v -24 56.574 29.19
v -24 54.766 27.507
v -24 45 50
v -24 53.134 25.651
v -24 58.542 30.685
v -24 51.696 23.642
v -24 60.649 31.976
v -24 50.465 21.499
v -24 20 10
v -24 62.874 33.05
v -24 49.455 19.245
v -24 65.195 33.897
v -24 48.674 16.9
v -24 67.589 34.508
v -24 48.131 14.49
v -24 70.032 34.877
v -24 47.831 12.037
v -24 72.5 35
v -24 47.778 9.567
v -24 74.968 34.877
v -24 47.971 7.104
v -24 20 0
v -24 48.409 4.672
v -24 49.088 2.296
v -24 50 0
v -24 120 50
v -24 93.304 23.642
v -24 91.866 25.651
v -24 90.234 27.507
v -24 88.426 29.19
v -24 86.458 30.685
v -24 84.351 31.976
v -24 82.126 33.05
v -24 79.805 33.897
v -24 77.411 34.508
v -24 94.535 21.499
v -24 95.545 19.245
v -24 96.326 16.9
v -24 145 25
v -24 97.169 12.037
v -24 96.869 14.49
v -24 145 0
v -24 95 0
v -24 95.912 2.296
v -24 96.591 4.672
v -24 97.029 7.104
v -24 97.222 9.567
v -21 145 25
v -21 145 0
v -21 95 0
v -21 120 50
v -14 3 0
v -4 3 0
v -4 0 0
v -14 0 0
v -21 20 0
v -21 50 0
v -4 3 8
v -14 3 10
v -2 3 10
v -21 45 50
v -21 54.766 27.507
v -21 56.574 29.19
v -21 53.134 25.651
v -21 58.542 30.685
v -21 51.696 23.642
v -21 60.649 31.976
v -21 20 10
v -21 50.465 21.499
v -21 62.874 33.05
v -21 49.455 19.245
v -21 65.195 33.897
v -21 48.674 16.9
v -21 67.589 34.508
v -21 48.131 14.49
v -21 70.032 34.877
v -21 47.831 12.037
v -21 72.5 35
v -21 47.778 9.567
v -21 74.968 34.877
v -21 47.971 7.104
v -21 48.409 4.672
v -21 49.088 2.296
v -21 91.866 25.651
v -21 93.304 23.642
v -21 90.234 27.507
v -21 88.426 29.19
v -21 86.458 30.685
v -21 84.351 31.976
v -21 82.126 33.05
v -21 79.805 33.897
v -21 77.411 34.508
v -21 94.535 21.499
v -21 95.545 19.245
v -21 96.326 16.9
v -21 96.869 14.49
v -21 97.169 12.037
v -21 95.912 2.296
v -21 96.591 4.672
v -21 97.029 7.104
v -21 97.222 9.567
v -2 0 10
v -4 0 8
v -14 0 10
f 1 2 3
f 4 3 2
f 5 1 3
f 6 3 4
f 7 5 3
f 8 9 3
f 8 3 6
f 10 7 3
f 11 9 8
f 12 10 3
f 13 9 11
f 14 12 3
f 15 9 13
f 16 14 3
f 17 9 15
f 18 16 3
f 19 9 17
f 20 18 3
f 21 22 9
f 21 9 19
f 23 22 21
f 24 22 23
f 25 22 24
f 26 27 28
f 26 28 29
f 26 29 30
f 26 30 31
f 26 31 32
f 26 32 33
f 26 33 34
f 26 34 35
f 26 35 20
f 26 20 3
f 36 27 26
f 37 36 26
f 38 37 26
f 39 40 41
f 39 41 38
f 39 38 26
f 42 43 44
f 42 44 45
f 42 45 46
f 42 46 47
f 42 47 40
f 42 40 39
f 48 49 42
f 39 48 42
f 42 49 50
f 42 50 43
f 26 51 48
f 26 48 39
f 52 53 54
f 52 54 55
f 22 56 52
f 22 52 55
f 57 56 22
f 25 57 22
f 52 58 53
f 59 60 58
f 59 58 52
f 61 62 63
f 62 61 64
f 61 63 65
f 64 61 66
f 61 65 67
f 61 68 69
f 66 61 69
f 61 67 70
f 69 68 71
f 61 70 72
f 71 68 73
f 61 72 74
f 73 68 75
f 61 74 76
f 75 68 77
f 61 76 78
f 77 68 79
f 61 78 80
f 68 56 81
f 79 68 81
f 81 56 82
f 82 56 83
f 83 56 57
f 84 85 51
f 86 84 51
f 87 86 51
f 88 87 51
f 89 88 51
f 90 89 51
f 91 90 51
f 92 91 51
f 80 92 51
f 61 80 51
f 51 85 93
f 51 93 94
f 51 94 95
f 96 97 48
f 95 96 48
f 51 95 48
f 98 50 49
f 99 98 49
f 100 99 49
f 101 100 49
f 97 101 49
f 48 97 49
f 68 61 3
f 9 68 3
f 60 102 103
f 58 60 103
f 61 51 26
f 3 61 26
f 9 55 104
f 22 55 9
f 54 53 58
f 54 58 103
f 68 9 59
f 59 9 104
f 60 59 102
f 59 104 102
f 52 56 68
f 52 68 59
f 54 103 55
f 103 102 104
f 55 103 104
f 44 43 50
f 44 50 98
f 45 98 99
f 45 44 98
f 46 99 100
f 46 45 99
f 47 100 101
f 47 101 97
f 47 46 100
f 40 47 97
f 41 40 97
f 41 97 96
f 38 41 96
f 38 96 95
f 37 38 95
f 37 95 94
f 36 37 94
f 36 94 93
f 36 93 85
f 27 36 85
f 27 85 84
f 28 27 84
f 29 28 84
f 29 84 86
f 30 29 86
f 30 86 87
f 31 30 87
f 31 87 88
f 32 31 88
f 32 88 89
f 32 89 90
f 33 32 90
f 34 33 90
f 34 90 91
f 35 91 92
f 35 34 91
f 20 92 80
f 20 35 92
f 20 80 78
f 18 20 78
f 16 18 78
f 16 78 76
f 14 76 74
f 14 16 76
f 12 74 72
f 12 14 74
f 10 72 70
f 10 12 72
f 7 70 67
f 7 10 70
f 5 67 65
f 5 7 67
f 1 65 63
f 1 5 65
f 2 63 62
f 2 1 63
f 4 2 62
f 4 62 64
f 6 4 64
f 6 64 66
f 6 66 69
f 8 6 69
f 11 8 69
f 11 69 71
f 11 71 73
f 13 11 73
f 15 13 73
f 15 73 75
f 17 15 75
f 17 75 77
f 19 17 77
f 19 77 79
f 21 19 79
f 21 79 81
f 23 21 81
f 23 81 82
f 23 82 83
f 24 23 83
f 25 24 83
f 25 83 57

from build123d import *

# Parameters (mm, degrees)
F1_DEPTH = 10
F3_DEPTH = 3
F4_W     = 3
F4_H     = 125
F5_DEPTH = 40
F6_SIZE2 = 24.99999
F6_SIZE  = 39.99999
F7_SIZE  = 25
F9_DEPTH = 25


# Not quite as in the source:
# - a fillet or chamfer is up to 0.001 mm smaller than in the source, because OpenCascade refuses the exact size


with BuildPart() as f1:
    # F0 (on Top) → F1 (new body)
    with BuildSketch(Plane.XY):
        Polygon((0, 3), (0, 0), (10, 0), (20, 20), (20, 145), (17, 145), (17, 20), (10, 3), align=None)
    extrude(amount=F1_DEPTH)

    # F2 (on Front) → F3 (join)
    with BuildSketch(Plane.XZ):
        Polygon((0, 8), (0, 10), (-2, 10), align=None)
    extrude(amount=-F3_DEPTH)

    # F4 (on face) → F5 (join)
    with BuildSketch(Plane.XY.offset(10)):
        with Locations((18.5, 82.5)):
            Rectangle(F4_W, F4_H)
    extrude(amount=F5_DEPTH)

    # F6 (size 40 and 25 in the source; OpenCascade refuses exactly that, so slightly less here)
    f6_edges = [f1.edges().sort_by_distance(p)[0] for p in [
        (18.5, 20, 50),
    ]]
    f6_side = f1.faces().sort_by_distance((18.5, 20, 30))[0]
    chamfer(f6_edges, length=F6_SIZE, length2=F6_SIZE2, reference=f6_side)

    # F7
    f7_edges = [f1.edges().sort_by_distance(p)[0] for p in [
        (18.5, 145, 50),
    ]]
    chamfer(f7_edges, length=F7_SIZE)

    # F8 (on face) → F9 (cut)
    with BuildSketch(Plane.YZ.offset(20)):
        with BuildLine():
            Line((50, 0), (95, 0))
            ThreePointArc((95, 0), (72.5, 35), (50, 0))
        make_face()
    extrude(amount=-F9_DEPTH, mode=Mode.SUBTRACT)


with BuildPart() as f11_1:
    # F11: instance of F1
    add(f1.part.mirror(Plane.YZ.offset(-2)))


solid = f11_1.part
